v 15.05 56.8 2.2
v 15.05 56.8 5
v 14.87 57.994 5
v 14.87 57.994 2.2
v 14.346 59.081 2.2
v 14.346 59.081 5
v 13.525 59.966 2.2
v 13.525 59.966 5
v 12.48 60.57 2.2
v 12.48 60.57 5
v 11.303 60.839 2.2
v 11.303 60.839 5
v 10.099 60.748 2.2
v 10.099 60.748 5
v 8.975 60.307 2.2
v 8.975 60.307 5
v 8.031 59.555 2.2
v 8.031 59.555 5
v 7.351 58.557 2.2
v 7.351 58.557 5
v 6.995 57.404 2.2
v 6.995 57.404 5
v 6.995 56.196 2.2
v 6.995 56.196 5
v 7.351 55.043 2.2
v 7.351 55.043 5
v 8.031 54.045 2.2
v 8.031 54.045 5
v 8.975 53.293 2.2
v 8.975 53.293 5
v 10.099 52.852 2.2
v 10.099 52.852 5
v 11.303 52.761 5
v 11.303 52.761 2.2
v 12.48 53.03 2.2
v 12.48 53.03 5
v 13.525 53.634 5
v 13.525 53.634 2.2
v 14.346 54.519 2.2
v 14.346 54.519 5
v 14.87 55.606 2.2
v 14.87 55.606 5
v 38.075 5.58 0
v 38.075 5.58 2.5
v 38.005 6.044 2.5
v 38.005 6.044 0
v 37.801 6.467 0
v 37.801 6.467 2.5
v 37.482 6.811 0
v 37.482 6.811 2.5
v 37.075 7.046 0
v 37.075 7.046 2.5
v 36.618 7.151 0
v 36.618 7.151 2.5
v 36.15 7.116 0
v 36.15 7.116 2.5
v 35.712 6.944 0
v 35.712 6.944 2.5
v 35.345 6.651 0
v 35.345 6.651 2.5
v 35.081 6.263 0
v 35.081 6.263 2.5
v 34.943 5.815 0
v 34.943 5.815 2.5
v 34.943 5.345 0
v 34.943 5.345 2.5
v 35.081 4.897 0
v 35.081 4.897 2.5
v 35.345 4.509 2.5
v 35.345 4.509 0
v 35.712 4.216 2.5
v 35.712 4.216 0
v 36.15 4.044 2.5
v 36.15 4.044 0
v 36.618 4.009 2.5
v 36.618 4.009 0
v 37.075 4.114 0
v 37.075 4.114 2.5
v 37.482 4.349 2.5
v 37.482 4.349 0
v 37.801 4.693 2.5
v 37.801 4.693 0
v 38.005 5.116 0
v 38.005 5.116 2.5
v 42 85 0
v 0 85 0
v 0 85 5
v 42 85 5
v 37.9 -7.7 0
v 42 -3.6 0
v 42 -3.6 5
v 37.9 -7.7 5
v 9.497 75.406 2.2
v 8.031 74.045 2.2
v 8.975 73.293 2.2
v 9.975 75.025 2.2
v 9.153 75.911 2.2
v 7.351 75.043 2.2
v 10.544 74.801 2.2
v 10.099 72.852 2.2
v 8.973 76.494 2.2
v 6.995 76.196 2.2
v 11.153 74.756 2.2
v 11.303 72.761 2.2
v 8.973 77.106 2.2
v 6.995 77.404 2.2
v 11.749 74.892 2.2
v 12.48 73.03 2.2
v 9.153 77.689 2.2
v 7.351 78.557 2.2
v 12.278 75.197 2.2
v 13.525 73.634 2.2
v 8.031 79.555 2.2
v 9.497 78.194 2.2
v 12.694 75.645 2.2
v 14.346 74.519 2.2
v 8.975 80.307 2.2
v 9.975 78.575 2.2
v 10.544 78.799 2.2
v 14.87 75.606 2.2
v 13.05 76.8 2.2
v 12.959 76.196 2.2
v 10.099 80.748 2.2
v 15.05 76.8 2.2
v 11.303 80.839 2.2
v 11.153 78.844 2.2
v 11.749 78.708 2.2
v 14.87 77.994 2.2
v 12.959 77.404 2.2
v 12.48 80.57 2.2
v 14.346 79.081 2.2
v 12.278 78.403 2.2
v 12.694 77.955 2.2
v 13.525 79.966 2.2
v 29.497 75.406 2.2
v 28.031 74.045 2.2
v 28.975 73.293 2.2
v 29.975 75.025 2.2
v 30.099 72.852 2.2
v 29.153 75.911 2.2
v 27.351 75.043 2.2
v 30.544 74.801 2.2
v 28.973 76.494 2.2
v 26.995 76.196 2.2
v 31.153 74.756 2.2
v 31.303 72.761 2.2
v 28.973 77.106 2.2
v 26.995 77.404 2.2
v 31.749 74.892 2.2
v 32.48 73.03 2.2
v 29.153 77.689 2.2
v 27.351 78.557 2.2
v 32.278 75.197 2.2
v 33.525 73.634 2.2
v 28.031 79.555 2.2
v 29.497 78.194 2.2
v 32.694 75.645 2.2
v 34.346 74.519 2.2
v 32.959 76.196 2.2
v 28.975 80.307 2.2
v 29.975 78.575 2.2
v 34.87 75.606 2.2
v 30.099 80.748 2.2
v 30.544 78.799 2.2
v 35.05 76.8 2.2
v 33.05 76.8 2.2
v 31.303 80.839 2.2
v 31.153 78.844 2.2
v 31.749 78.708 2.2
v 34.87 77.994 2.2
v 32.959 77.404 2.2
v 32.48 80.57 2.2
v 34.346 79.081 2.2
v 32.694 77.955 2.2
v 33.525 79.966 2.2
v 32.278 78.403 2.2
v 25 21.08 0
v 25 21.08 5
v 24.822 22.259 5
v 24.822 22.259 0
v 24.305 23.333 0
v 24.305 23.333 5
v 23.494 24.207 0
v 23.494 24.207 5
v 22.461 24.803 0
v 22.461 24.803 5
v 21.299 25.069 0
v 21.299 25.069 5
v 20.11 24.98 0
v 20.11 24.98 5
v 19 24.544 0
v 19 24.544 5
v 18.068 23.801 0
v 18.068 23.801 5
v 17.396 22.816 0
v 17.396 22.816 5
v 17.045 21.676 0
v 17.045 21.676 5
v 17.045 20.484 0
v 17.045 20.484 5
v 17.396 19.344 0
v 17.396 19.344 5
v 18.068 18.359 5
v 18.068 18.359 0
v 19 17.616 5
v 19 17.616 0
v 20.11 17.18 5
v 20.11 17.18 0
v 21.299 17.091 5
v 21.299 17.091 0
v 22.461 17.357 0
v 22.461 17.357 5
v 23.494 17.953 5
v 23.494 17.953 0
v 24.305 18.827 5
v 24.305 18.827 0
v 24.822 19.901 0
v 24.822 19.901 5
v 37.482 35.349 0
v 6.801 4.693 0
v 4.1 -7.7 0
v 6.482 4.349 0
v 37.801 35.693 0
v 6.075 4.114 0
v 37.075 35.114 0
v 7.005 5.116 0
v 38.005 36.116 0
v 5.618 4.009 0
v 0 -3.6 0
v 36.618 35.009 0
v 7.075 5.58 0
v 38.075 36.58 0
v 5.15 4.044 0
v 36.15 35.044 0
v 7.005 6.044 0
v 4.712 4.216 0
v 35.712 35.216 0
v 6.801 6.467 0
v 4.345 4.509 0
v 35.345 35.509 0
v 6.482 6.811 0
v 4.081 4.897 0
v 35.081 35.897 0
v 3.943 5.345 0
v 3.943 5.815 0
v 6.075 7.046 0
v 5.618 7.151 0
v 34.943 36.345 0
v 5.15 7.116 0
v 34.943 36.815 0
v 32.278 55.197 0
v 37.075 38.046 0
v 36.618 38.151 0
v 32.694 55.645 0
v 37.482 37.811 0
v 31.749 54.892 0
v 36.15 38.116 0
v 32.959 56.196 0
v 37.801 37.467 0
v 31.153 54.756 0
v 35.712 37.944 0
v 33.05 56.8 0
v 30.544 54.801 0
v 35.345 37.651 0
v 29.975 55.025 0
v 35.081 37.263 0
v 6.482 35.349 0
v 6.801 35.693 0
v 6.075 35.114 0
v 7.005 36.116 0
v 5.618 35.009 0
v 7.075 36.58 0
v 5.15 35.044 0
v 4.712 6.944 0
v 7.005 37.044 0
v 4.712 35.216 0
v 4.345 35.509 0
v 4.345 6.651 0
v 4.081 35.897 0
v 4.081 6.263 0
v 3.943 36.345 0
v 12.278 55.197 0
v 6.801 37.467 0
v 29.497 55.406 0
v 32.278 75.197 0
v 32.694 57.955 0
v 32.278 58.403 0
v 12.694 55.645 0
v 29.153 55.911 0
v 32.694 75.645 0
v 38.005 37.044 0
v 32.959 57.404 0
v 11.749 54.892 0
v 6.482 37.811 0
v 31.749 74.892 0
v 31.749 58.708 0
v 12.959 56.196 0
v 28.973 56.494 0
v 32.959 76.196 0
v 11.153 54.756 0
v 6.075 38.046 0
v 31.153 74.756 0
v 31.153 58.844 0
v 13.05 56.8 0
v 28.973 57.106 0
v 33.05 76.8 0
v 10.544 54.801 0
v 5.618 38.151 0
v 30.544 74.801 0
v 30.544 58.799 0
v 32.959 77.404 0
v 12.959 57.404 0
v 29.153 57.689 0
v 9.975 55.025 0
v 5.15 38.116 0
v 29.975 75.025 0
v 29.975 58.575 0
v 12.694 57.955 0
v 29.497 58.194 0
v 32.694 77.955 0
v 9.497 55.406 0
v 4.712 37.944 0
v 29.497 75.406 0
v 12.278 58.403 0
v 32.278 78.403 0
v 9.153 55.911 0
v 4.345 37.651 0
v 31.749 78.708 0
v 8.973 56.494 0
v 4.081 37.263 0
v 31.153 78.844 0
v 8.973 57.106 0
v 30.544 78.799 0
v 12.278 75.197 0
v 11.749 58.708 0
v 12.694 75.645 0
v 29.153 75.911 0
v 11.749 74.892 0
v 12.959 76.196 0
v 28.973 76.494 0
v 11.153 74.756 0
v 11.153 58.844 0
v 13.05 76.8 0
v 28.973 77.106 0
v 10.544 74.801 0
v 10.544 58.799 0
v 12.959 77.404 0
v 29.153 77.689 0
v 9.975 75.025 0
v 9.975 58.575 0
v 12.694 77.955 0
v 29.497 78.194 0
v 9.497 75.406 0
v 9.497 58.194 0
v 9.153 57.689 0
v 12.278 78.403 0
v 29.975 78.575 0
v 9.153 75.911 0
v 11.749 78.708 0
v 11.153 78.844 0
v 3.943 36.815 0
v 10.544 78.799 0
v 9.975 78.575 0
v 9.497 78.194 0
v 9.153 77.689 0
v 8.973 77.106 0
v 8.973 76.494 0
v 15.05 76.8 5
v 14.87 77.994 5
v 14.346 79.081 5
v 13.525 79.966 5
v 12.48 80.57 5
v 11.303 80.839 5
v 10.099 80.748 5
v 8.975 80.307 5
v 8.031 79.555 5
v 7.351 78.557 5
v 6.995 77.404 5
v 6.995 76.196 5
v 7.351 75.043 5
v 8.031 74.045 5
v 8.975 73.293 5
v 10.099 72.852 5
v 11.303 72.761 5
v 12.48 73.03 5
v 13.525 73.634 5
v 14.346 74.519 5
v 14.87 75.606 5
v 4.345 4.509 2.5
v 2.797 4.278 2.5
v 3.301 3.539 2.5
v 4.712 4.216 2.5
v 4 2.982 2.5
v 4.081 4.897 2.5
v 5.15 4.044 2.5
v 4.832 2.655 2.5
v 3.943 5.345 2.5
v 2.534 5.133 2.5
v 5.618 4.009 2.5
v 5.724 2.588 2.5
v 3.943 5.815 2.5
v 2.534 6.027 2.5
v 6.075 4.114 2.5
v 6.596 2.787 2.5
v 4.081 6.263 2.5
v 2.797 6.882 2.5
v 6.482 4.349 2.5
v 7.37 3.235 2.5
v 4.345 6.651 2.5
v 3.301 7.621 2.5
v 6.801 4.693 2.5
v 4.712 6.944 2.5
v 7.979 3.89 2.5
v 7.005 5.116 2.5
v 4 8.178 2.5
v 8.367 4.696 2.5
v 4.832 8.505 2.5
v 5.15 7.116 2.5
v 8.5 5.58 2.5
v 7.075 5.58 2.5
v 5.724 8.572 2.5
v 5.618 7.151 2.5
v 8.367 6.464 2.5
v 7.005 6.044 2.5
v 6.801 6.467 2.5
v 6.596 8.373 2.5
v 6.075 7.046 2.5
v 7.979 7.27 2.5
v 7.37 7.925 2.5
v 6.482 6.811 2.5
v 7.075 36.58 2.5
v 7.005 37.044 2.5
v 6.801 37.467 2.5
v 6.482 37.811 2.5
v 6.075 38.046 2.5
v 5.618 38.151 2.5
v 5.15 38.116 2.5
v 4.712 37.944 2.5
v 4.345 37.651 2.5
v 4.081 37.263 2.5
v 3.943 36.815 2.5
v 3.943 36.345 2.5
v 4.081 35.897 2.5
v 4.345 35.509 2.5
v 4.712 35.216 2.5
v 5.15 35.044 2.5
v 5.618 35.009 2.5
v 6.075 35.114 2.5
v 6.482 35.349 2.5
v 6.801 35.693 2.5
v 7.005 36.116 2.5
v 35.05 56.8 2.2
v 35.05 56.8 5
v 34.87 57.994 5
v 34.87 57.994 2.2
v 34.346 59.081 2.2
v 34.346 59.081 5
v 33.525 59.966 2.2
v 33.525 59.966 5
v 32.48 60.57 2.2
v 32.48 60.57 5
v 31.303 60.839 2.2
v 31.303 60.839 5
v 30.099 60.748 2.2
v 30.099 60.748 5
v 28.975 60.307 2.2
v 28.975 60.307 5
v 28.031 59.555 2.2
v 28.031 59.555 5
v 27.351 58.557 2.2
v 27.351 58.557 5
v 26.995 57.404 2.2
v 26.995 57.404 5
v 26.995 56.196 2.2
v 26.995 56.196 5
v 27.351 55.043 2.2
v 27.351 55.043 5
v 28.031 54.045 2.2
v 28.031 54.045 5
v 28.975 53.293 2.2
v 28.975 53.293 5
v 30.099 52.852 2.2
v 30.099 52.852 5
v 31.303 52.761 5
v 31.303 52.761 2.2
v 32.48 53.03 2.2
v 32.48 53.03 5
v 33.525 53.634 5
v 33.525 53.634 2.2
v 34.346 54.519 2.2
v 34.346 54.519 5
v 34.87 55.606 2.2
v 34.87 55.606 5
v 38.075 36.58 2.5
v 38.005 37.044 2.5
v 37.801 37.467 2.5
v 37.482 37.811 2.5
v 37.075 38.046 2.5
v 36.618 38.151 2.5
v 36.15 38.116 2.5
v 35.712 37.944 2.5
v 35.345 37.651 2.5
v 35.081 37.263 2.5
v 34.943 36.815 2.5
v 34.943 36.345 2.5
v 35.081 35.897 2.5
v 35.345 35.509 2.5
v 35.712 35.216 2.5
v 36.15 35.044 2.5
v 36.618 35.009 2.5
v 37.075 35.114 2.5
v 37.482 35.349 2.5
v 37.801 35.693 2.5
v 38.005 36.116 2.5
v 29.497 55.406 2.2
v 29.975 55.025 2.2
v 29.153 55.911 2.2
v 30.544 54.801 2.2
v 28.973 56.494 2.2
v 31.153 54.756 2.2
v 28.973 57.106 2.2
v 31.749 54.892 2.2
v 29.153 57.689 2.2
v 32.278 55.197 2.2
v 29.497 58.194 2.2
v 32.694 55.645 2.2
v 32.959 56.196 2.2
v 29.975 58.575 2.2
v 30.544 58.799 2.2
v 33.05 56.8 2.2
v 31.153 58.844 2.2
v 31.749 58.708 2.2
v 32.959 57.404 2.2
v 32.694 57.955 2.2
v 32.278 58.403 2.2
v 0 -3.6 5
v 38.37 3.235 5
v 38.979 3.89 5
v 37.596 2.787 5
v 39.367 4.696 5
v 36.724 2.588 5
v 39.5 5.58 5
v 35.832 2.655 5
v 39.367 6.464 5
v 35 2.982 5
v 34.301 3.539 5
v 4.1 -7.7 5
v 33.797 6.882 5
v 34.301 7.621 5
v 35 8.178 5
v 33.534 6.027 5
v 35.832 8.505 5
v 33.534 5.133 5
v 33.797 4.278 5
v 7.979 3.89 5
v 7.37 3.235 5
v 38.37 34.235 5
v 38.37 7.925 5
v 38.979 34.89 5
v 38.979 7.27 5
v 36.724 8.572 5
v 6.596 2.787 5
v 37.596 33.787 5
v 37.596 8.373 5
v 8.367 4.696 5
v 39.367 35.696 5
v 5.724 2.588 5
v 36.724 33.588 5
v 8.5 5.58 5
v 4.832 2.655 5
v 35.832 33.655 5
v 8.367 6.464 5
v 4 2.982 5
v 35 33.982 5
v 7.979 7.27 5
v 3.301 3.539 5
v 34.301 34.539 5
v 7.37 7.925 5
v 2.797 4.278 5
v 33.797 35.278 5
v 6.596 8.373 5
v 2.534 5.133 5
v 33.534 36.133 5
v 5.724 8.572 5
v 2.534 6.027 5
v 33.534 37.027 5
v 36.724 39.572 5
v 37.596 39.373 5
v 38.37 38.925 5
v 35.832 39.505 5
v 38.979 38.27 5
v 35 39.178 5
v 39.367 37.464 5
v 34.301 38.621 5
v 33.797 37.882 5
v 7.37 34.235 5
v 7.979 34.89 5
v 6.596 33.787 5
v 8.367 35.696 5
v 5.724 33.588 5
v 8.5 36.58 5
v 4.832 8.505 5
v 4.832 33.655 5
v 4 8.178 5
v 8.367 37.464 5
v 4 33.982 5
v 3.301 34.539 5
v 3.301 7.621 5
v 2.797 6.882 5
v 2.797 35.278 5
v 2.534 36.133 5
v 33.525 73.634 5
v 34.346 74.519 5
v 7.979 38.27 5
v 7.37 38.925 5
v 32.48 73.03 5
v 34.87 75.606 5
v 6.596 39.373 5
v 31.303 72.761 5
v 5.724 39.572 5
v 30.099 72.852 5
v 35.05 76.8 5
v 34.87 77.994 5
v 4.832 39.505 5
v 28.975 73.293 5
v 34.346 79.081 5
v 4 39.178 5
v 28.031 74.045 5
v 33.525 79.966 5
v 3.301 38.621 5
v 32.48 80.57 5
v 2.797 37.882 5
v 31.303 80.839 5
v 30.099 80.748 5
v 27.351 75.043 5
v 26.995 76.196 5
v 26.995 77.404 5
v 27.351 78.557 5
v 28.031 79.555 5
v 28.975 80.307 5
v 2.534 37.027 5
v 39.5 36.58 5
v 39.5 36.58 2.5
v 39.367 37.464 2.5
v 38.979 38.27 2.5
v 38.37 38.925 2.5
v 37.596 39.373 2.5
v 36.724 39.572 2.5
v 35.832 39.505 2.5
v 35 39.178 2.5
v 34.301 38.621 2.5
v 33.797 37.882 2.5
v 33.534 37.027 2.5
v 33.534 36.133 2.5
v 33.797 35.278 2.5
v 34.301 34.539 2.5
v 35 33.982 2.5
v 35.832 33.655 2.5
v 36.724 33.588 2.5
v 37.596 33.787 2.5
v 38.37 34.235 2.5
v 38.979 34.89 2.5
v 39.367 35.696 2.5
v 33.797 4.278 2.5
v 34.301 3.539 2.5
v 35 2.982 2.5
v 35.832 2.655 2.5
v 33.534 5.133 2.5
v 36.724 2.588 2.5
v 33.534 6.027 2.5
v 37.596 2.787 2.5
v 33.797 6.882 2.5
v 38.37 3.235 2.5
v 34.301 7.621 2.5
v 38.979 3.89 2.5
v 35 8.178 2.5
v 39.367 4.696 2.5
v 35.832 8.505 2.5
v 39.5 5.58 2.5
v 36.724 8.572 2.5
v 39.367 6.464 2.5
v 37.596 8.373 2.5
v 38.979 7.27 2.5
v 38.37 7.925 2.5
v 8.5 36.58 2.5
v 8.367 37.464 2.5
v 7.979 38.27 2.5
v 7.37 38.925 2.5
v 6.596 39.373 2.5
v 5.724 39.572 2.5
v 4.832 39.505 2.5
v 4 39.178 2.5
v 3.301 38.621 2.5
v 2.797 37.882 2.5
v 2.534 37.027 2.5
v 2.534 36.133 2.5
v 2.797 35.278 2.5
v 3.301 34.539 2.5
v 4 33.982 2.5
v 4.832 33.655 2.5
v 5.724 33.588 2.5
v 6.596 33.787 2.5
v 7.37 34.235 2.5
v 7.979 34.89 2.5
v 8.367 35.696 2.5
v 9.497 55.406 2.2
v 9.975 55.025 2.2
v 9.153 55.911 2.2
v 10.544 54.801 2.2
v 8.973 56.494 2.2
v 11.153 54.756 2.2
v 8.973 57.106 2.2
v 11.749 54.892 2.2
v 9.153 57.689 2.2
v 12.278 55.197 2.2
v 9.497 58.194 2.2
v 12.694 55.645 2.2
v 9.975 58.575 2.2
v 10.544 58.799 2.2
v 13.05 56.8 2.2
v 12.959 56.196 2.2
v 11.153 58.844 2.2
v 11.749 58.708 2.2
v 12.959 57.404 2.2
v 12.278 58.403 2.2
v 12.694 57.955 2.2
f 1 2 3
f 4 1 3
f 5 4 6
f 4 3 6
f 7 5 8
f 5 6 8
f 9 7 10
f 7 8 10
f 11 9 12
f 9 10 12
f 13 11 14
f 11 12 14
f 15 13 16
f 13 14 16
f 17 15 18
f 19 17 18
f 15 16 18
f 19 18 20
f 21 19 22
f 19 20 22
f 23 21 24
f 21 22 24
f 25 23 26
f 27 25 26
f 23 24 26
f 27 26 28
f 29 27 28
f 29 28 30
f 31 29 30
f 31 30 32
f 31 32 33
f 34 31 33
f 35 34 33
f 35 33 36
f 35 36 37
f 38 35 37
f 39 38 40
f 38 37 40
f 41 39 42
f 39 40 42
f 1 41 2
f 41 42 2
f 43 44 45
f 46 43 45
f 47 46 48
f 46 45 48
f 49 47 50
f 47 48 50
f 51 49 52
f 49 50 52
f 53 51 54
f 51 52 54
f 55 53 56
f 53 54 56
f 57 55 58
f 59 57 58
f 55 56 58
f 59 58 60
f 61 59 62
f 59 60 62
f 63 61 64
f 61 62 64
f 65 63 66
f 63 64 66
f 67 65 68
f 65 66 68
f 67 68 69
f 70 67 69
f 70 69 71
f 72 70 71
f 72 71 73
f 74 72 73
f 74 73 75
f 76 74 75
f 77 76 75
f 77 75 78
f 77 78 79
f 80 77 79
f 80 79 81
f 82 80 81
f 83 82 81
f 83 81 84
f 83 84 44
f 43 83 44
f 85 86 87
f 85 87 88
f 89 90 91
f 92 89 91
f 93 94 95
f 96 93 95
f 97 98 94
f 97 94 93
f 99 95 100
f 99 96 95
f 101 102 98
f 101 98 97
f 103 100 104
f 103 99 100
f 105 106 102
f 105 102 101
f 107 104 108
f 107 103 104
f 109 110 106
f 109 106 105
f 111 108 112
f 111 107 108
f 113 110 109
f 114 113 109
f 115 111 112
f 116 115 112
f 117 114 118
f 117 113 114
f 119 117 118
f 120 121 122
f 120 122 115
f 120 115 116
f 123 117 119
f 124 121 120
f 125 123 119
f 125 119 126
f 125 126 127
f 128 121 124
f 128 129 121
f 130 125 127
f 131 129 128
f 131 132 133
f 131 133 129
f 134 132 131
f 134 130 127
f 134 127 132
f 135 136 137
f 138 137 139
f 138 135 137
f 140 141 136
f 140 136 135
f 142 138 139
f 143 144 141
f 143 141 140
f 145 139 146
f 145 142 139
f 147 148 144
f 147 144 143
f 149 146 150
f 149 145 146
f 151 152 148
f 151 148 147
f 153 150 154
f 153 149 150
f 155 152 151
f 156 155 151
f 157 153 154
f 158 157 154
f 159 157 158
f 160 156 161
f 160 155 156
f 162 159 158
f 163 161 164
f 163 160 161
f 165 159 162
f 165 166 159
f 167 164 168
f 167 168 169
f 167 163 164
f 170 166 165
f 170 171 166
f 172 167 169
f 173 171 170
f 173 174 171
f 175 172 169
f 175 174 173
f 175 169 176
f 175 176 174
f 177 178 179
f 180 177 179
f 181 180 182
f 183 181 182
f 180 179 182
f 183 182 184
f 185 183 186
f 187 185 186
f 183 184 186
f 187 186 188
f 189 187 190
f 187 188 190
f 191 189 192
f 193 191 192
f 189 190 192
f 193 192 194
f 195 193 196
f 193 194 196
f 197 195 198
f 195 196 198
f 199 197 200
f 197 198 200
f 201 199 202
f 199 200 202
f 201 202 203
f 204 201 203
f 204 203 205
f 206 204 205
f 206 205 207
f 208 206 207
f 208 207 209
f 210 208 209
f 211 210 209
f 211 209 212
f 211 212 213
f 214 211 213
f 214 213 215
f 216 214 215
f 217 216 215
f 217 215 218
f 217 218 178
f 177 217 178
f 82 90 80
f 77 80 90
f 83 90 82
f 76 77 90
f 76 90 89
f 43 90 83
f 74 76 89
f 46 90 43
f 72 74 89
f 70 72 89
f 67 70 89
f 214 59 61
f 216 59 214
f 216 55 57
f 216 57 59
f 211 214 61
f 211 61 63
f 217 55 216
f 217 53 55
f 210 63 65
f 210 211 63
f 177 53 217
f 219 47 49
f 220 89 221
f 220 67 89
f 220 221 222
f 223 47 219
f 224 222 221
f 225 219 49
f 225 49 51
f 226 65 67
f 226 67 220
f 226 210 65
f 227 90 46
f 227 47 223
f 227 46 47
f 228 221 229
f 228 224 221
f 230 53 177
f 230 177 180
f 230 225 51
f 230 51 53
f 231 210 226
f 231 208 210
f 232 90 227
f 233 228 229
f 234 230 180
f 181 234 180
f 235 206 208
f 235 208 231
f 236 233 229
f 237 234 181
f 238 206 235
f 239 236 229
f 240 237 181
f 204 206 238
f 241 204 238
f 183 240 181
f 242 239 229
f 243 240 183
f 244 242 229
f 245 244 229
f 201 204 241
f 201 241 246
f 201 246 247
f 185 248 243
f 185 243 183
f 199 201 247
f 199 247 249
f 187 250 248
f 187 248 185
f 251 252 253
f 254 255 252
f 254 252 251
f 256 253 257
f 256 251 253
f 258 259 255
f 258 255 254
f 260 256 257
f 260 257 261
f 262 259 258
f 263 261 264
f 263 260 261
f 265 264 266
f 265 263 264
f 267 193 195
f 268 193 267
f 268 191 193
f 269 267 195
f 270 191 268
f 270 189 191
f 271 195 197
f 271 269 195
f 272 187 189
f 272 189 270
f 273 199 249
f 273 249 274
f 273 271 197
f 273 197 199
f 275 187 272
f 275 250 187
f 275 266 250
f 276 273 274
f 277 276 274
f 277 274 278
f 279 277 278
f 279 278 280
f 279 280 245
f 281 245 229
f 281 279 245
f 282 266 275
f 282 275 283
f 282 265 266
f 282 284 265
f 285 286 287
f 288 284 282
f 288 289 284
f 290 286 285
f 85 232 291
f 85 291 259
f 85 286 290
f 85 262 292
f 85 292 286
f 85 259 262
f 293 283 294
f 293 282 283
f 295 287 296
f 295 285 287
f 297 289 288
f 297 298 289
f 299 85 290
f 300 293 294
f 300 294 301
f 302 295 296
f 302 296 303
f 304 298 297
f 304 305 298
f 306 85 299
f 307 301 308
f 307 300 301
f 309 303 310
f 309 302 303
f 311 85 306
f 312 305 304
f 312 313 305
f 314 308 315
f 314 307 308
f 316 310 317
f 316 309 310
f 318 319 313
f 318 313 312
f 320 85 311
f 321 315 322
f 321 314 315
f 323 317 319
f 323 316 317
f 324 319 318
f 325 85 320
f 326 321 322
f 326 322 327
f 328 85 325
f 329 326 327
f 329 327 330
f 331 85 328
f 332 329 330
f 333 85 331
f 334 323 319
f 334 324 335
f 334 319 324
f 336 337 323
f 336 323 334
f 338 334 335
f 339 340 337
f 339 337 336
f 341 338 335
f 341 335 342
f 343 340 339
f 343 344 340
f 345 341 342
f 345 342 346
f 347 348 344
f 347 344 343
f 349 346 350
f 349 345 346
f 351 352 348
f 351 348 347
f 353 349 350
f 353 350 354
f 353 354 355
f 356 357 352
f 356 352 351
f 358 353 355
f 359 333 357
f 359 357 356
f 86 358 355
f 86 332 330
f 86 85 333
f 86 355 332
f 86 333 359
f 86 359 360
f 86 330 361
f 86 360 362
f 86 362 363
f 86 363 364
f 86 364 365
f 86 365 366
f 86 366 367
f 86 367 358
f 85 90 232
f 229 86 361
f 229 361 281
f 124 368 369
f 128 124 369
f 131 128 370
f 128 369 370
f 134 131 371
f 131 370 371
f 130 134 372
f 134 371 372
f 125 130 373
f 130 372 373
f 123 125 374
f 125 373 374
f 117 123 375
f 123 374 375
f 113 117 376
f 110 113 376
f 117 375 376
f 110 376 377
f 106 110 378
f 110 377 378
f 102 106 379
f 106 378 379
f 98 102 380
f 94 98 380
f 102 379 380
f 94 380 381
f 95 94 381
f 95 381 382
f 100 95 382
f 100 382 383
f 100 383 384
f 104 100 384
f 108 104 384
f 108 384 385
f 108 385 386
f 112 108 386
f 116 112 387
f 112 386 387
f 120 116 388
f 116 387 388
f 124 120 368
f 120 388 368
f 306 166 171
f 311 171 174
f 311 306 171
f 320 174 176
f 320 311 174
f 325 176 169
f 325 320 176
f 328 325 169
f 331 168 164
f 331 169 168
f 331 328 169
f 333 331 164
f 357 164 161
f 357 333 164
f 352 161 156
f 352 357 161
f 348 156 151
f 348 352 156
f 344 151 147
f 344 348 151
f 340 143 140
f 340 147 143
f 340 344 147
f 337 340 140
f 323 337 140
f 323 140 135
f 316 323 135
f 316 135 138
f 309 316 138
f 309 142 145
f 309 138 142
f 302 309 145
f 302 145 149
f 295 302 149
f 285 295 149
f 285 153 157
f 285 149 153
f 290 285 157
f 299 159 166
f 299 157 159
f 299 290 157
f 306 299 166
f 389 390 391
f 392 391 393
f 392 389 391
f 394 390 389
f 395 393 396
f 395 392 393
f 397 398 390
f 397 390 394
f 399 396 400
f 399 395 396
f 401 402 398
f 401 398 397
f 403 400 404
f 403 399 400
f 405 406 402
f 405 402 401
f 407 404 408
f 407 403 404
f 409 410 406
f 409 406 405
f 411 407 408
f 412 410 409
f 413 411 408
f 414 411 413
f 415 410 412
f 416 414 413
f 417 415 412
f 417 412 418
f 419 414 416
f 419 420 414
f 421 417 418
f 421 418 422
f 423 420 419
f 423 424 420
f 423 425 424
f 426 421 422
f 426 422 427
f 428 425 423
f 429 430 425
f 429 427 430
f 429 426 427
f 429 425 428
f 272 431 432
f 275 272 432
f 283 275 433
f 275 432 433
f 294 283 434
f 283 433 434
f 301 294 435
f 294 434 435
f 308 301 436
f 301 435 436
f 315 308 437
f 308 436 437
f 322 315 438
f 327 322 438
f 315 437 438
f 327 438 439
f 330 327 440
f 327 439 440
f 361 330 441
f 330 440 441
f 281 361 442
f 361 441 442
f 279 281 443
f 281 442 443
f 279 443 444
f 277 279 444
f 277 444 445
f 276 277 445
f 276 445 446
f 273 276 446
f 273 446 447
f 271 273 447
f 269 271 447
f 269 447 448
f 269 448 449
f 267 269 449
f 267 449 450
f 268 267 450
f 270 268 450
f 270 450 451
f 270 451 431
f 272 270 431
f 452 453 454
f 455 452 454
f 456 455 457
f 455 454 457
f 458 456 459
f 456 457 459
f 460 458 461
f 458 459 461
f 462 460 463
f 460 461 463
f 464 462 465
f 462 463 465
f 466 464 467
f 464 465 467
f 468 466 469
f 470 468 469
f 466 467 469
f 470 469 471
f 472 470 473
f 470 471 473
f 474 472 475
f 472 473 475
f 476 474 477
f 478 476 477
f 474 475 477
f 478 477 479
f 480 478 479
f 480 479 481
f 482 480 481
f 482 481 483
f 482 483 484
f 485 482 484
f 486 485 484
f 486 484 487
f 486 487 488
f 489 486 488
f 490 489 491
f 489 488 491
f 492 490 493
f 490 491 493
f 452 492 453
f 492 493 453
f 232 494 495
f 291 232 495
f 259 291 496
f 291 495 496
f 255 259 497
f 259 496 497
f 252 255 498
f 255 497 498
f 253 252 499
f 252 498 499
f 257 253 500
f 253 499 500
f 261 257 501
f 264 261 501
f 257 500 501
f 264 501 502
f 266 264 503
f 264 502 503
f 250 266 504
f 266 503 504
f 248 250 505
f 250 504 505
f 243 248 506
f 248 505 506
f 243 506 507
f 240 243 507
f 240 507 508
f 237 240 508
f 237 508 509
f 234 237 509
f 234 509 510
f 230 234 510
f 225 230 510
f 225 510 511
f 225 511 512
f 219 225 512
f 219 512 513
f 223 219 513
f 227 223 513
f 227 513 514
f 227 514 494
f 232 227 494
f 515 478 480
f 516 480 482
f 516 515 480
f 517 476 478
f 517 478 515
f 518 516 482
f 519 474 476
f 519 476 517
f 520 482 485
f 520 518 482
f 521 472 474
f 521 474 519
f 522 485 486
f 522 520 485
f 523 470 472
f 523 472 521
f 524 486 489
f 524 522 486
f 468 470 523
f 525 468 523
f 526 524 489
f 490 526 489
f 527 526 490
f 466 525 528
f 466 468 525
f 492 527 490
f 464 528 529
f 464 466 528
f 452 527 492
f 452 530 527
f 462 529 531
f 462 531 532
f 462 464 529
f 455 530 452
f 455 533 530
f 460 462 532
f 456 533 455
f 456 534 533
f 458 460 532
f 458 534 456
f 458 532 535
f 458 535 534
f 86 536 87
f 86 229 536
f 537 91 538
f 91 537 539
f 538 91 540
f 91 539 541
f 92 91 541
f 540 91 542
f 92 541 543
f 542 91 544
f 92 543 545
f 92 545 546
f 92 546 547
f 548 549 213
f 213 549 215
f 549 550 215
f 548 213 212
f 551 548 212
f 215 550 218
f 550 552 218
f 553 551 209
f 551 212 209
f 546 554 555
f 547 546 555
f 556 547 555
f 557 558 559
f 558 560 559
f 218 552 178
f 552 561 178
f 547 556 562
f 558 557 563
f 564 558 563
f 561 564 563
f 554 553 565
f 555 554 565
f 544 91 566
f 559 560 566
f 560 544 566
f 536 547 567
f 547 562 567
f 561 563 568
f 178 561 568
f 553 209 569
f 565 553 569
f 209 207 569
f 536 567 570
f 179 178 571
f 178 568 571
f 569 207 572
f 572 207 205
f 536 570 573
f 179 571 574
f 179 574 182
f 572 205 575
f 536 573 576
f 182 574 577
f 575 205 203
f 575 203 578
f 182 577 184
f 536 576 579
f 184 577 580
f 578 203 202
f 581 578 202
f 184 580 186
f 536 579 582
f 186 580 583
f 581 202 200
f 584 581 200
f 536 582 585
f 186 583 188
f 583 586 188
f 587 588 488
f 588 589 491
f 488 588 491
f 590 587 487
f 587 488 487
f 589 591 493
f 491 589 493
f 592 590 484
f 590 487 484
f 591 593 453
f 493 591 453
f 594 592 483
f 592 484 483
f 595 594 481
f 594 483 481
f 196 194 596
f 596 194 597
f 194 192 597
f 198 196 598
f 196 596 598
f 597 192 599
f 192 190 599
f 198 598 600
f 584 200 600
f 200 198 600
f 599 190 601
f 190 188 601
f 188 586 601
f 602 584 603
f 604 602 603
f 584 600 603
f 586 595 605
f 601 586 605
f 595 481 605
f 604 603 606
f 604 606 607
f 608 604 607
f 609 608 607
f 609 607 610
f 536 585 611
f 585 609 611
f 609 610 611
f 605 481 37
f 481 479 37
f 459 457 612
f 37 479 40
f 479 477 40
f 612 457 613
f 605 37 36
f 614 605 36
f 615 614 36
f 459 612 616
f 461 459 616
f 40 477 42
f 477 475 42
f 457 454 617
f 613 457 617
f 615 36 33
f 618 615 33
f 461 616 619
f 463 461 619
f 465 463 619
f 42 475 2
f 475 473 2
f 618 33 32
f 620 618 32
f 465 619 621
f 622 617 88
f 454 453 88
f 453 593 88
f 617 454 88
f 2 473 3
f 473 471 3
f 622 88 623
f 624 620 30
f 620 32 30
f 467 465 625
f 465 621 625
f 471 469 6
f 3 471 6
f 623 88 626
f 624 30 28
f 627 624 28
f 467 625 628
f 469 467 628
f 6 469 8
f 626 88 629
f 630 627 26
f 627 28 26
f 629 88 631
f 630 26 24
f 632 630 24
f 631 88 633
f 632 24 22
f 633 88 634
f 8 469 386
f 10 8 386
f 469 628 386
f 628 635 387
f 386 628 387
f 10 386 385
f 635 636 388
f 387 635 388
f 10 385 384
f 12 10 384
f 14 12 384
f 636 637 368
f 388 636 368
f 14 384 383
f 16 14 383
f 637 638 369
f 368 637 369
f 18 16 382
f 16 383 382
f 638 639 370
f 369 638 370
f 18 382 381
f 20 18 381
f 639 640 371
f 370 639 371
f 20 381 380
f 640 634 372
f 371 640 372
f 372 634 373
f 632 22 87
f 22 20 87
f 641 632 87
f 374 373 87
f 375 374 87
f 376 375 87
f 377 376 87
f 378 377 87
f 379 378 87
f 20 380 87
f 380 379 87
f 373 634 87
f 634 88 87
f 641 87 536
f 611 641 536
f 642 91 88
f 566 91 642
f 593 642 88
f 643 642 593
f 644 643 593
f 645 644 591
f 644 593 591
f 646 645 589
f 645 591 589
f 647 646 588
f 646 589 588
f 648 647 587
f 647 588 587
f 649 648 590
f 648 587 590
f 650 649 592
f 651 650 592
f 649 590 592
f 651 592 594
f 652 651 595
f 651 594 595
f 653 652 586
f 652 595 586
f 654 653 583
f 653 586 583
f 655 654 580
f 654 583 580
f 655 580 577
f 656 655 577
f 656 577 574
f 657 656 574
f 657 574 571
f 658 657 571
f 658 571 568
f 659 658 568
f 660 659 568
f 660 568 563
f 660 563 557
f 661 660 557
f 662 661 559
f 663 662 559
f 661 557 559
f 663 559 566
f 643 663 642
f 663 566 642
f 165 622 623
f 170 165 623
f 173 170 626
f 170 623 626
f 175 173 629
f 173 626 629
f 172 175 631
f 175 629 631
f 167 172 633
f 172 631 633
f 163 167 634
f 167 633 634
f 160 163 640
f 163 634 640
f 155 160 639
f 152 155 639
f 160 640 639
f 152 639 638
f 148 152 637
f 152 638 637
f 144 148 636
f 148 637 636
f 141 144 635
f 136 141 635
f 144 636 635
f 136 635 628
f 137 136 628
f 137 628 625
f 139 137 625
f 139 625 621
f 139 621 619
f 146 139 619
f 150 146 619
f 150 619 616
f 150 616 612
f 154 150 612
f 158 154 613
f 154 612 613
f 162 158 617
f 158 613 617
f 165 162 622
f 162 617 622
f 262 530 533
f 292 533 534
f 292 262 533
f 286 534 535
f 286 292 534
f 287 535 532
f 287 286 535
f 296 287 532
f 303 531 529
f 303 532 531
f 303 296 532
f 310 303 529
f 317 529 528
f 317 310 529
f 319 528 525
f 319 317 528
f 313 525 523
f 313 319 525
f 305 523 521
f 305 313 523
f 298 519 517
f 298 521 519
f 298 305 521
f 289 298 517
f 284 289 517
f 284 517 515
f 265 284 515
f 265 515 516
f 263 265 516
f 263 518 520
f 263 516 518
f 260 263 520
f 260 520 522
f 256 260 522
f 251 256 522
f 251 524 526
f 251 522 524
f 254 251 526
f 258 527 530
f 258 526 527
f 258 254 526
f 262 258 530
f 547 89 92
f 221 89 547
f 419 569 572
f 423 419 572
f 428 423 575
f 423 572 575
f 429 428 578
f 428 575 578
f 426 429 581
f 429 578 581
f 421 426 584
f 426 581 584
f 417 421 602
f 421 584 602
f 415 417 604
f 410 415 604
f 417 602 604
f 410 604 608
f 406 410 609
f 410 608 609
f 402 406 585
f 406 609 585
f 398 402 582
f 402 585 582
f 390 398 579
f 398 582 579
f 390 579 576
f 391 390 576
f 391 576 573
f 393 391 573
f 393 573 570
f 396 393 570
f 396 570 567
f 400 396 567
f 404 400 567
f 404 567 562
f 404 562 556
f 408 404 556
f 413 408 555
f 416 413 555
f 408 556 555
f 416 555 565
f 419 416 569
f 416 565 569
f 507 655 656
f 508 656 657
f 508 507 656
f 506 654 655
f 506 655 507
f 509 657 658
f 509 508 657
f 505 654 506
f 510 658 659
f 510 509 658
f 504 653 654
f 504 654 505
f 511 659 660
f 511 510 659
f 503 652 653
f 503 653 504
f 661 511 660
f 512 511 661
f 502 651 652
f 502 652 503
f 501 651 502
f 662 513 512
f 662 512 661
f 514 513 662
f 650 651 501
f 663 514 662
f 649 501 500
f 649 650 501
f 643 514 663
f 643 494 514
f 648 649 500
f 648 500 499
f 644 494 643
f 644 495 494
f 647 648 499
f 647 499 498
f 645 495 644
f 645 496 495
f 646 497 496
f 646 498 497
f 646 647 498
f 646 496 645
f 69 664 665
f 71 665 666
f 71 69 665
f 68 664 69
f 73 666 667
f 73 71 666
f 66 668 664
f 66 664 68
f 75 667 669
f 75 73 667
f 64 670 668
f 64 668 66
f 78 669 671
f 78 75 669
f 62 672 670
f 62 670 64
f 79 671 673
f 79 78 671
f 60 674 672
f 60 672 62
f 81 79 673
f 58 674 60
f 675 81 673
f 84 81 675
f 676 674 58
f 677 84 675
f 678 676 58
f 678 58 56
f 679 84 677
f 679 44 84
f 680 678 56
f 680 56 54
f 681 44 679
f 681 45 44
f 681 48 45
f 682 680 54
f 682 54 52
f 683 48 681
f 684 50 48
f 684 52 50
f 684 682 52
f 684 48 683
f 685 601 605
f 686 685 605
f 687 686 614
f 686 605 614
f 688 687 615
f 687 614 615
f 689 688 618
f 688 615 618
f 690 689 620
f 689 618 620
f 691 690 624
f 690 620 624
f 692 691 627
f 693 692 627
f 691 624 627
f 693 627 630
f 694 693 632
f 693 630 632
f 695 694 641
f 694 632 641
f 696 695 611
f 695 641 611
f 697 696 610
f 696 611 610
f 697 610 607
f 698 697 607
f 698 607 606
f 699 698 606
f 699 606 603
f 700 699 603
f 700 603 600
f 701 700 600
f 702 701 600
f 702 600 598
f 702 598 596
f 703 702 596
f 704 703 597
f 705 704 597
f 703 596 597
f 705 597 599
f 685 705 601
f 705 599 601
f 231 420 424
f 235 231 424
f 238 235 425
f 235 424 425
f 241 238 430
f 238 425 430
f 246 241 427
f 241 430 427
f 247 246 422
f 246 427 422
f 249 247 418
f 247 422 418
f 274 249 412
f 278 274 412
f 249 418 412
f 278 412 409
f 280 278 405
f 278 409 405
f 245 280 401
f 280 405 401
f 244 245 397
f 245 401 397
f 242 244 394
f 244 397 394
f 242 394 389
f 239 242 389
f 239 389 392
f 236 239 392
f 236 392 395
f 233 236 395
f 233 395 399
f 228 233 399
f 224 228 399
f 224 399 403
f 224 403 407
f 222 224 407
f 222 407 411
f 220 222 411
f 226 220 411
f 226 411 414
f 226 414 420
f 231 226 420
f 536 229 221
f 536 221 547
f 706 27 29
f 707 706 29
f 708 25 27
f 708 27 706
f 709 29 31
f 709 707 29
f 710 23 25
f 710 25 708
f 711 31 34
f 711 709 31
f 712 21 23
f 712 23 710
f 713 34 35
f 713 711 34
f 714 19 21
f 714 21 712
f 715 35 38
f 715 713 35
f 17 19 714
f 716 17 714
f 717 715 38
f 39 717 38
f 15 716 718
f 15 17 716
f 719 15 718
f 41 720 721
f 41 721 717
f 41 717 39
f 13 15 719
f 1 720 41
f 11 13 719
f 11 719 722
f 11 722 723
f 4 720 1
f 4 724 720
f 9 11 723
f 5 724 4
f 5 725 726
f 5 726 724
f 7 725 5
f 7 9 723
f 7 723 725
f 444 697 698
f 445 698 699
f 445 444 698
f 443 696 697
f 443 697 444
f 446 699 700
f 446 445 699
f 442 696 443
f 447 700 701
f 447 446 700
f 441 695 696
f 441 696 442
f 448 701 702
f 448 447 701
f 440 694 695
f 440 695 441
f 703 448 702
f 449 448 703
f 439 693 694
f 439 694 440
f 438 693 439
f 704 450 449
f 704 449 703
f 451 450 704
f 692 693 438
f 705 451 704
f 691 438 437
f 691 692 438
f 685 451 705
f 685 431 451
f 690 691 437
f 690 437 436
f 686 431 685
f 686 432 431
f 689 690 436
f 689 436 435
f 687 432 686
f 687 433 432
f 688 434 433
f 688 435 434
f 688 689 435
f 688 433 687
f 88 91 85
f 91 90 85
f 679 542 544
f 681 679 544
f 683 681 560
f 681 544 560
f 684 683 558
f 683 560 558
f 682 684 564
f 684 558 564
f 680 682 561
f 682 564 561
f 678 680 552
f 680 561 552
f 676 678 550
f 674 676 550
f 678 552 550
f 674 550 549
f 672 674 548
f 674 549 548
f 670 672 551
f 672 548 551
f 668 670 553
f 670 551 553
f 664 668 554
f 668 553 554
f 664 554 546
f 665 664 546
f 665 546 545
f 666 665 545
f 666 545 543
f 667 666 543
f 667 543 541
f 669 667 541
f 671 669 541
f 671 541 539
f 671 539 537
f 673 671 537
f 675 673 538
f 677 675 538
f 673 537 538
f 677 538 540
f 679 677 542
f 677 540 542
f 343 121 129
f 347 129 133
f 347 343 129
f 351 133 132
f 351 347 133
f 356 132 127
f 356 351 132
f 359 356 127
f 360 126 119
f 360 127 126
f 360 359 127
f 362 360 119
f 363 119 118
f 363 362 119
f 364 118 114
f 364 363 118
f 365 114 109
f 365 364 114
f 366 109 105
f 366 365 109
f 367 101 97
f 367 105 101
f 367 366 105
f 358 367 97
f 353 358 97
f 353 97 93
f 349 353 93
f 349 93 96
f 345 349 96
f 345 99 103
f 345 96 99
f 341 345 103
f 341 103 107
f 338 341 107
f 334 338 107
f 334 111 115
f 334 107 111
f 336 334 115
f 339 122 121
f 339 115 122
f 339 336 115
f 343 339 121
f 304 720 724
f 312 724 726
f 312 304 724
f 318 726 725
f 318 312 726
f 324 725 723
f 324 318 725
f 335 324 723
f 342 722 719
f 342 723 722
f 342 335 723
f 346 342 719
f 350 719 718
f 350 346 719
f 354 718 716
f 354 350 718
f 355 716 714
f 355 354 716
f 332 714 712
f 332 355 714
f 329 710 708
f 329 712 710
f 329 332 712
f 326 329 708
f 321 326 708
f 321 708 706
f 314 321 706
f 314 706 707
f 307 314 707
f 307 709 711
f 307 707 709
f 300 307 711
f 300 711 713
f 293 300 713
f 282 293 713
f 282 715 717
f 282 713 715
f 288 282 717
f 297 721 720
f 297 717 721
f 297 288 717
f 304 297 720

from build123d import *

# Parameters (mm, degrees)
CROQUIS1_W              = 42
CROQUIS1_H              = 85
CROQUIS1_R              = 2.05
SALIENTE_EXTRUIR1_DEPTH = 5
CROQUIS4_R              = 4.05
CORTAR_EXTRUIR1_DEPTH   = 2.8
CROQUIS5_R              = 1.575
CROQUIS5_R_2            = 4
CORTAR_EXTRUIR2_DEPTH   = 6
CROQUIS6_R              = 3
CORTAR_EXTRUIR3_DEPTH   = 2.5
CROQUIS7_W              = 42
CROQUIS7_H              = 7.7
SALIENTE_EXTRUIR2_DEPTH = 5
CHAFL_N1_SIZE           = 4.1


with BuildPart() as part:
    # Croquis1 → Saliente-Extruir1 (new body)
    with BuildSketch(Plane.XY):
        with Locations((21, 42.5)):
            Rectangle(CROQUIS1_W, CROQUIS1_H)
        with Locations((11, 76.8)):
            Circle(CROQUIS1_R, mode=Mode.SUBTRACT)
        with Locations((31, 76.8)):
            Circle(CROQUIS1_R, mode=Mode.SUBTRACT)
        with Locations((31, 56.8)):
            Circle(CROQUIS1_R, mode=Mode.SUBTRACT)
        with Locations((11, 56.8)):
            Circle(CROQUIS1_R, mode=Mode.SUBTRACT)
    extrude(amount=SALIENTE_EXTRUIR1_DEPTH)

    # Croquis4 → Cortar-Extruir1 (cut)
    with BuildSketch(Plane.XY.offset(5)):
        with Locations((11, 76.8)):
            Circle(CROQUIS4_R)
        with Locations((11, 56.8)):
            Circle(CROQUIS4_R)
        with Locations((31, 56.8)):
            Circle(CROQUIS4_R)
        with Locations((31, 76.8)):
            Circle(CROQUIS4_R)
    extrude(amount=-CORTAR_EXTRUIR1_DEPTH, mode=Mode.SUBTRACT)

    # Croquis5 → Cortar-Extruir2 (cut, through all)
    with BuildSketch(Plane.XY.offset(5)):
        with Locations((5.5, 36.58)):
            Circle(CROQUIS5_R)
        with Locations((36.5, 36.58)):
            Circle(CROQUIS5_R)
        with Locations((36.5, 5.58)):
            Circle(CROQUIS5_R)
        with Locations((5.5, 5.58)):
            Circle(CROQUIS5_R)
        with Locations((21, 21.08)):
            Circle(CROQUIS5_R_2)
    extrude(amount=-CORTAR_EXTRUIR2_DEPTH, mode=Mode.SUBTRACT)

    # Croquis6 → Cortar-Extruir3 (cut)
    with BuildSketch(Plane.XY.offset(5)):
        with Locations((5.5, 36.58)):
            Circle(CROQUIS6_R)
        with Locations((36.5, 36.58)):
            Circle(CROQUIS6_R)
        with Locations((36.5, 5.58)):
            Circle(CROQUIS6_R)
        with Locations((5.5, 5.58)):
            Circle(CROQUIS6_R)
    extrude(amount=-CORTAR_EXTRUIR3_DEPTH, mode=Mode.SUBTRACT)

    # Croquis7 → Saliente-Extruir2 (add, through all)
    with BuildSketch(Plane(origin=(0, 0, 0), x_dir=(-1, 0, 0), z_dir=(0, 0, -1))):
        with Locations((-21, -3.85)):
            Rectangle(CROQUIS7_W, CROQUIS7_H)
    extrude(amount=-SALIENTE_EXTRUIR2_DEPTH)

    # Chaflán1
    chafl_n1_edges = [part.edges().sort_by_distance(p)[0] for p in [
        (42, -7.7, 2.5),
        (0, -7.7, 2.5),
    ]]
    chamfer(chafl_n1_edges, length=CHAFL_N1_SIZE)


solid = part.part
